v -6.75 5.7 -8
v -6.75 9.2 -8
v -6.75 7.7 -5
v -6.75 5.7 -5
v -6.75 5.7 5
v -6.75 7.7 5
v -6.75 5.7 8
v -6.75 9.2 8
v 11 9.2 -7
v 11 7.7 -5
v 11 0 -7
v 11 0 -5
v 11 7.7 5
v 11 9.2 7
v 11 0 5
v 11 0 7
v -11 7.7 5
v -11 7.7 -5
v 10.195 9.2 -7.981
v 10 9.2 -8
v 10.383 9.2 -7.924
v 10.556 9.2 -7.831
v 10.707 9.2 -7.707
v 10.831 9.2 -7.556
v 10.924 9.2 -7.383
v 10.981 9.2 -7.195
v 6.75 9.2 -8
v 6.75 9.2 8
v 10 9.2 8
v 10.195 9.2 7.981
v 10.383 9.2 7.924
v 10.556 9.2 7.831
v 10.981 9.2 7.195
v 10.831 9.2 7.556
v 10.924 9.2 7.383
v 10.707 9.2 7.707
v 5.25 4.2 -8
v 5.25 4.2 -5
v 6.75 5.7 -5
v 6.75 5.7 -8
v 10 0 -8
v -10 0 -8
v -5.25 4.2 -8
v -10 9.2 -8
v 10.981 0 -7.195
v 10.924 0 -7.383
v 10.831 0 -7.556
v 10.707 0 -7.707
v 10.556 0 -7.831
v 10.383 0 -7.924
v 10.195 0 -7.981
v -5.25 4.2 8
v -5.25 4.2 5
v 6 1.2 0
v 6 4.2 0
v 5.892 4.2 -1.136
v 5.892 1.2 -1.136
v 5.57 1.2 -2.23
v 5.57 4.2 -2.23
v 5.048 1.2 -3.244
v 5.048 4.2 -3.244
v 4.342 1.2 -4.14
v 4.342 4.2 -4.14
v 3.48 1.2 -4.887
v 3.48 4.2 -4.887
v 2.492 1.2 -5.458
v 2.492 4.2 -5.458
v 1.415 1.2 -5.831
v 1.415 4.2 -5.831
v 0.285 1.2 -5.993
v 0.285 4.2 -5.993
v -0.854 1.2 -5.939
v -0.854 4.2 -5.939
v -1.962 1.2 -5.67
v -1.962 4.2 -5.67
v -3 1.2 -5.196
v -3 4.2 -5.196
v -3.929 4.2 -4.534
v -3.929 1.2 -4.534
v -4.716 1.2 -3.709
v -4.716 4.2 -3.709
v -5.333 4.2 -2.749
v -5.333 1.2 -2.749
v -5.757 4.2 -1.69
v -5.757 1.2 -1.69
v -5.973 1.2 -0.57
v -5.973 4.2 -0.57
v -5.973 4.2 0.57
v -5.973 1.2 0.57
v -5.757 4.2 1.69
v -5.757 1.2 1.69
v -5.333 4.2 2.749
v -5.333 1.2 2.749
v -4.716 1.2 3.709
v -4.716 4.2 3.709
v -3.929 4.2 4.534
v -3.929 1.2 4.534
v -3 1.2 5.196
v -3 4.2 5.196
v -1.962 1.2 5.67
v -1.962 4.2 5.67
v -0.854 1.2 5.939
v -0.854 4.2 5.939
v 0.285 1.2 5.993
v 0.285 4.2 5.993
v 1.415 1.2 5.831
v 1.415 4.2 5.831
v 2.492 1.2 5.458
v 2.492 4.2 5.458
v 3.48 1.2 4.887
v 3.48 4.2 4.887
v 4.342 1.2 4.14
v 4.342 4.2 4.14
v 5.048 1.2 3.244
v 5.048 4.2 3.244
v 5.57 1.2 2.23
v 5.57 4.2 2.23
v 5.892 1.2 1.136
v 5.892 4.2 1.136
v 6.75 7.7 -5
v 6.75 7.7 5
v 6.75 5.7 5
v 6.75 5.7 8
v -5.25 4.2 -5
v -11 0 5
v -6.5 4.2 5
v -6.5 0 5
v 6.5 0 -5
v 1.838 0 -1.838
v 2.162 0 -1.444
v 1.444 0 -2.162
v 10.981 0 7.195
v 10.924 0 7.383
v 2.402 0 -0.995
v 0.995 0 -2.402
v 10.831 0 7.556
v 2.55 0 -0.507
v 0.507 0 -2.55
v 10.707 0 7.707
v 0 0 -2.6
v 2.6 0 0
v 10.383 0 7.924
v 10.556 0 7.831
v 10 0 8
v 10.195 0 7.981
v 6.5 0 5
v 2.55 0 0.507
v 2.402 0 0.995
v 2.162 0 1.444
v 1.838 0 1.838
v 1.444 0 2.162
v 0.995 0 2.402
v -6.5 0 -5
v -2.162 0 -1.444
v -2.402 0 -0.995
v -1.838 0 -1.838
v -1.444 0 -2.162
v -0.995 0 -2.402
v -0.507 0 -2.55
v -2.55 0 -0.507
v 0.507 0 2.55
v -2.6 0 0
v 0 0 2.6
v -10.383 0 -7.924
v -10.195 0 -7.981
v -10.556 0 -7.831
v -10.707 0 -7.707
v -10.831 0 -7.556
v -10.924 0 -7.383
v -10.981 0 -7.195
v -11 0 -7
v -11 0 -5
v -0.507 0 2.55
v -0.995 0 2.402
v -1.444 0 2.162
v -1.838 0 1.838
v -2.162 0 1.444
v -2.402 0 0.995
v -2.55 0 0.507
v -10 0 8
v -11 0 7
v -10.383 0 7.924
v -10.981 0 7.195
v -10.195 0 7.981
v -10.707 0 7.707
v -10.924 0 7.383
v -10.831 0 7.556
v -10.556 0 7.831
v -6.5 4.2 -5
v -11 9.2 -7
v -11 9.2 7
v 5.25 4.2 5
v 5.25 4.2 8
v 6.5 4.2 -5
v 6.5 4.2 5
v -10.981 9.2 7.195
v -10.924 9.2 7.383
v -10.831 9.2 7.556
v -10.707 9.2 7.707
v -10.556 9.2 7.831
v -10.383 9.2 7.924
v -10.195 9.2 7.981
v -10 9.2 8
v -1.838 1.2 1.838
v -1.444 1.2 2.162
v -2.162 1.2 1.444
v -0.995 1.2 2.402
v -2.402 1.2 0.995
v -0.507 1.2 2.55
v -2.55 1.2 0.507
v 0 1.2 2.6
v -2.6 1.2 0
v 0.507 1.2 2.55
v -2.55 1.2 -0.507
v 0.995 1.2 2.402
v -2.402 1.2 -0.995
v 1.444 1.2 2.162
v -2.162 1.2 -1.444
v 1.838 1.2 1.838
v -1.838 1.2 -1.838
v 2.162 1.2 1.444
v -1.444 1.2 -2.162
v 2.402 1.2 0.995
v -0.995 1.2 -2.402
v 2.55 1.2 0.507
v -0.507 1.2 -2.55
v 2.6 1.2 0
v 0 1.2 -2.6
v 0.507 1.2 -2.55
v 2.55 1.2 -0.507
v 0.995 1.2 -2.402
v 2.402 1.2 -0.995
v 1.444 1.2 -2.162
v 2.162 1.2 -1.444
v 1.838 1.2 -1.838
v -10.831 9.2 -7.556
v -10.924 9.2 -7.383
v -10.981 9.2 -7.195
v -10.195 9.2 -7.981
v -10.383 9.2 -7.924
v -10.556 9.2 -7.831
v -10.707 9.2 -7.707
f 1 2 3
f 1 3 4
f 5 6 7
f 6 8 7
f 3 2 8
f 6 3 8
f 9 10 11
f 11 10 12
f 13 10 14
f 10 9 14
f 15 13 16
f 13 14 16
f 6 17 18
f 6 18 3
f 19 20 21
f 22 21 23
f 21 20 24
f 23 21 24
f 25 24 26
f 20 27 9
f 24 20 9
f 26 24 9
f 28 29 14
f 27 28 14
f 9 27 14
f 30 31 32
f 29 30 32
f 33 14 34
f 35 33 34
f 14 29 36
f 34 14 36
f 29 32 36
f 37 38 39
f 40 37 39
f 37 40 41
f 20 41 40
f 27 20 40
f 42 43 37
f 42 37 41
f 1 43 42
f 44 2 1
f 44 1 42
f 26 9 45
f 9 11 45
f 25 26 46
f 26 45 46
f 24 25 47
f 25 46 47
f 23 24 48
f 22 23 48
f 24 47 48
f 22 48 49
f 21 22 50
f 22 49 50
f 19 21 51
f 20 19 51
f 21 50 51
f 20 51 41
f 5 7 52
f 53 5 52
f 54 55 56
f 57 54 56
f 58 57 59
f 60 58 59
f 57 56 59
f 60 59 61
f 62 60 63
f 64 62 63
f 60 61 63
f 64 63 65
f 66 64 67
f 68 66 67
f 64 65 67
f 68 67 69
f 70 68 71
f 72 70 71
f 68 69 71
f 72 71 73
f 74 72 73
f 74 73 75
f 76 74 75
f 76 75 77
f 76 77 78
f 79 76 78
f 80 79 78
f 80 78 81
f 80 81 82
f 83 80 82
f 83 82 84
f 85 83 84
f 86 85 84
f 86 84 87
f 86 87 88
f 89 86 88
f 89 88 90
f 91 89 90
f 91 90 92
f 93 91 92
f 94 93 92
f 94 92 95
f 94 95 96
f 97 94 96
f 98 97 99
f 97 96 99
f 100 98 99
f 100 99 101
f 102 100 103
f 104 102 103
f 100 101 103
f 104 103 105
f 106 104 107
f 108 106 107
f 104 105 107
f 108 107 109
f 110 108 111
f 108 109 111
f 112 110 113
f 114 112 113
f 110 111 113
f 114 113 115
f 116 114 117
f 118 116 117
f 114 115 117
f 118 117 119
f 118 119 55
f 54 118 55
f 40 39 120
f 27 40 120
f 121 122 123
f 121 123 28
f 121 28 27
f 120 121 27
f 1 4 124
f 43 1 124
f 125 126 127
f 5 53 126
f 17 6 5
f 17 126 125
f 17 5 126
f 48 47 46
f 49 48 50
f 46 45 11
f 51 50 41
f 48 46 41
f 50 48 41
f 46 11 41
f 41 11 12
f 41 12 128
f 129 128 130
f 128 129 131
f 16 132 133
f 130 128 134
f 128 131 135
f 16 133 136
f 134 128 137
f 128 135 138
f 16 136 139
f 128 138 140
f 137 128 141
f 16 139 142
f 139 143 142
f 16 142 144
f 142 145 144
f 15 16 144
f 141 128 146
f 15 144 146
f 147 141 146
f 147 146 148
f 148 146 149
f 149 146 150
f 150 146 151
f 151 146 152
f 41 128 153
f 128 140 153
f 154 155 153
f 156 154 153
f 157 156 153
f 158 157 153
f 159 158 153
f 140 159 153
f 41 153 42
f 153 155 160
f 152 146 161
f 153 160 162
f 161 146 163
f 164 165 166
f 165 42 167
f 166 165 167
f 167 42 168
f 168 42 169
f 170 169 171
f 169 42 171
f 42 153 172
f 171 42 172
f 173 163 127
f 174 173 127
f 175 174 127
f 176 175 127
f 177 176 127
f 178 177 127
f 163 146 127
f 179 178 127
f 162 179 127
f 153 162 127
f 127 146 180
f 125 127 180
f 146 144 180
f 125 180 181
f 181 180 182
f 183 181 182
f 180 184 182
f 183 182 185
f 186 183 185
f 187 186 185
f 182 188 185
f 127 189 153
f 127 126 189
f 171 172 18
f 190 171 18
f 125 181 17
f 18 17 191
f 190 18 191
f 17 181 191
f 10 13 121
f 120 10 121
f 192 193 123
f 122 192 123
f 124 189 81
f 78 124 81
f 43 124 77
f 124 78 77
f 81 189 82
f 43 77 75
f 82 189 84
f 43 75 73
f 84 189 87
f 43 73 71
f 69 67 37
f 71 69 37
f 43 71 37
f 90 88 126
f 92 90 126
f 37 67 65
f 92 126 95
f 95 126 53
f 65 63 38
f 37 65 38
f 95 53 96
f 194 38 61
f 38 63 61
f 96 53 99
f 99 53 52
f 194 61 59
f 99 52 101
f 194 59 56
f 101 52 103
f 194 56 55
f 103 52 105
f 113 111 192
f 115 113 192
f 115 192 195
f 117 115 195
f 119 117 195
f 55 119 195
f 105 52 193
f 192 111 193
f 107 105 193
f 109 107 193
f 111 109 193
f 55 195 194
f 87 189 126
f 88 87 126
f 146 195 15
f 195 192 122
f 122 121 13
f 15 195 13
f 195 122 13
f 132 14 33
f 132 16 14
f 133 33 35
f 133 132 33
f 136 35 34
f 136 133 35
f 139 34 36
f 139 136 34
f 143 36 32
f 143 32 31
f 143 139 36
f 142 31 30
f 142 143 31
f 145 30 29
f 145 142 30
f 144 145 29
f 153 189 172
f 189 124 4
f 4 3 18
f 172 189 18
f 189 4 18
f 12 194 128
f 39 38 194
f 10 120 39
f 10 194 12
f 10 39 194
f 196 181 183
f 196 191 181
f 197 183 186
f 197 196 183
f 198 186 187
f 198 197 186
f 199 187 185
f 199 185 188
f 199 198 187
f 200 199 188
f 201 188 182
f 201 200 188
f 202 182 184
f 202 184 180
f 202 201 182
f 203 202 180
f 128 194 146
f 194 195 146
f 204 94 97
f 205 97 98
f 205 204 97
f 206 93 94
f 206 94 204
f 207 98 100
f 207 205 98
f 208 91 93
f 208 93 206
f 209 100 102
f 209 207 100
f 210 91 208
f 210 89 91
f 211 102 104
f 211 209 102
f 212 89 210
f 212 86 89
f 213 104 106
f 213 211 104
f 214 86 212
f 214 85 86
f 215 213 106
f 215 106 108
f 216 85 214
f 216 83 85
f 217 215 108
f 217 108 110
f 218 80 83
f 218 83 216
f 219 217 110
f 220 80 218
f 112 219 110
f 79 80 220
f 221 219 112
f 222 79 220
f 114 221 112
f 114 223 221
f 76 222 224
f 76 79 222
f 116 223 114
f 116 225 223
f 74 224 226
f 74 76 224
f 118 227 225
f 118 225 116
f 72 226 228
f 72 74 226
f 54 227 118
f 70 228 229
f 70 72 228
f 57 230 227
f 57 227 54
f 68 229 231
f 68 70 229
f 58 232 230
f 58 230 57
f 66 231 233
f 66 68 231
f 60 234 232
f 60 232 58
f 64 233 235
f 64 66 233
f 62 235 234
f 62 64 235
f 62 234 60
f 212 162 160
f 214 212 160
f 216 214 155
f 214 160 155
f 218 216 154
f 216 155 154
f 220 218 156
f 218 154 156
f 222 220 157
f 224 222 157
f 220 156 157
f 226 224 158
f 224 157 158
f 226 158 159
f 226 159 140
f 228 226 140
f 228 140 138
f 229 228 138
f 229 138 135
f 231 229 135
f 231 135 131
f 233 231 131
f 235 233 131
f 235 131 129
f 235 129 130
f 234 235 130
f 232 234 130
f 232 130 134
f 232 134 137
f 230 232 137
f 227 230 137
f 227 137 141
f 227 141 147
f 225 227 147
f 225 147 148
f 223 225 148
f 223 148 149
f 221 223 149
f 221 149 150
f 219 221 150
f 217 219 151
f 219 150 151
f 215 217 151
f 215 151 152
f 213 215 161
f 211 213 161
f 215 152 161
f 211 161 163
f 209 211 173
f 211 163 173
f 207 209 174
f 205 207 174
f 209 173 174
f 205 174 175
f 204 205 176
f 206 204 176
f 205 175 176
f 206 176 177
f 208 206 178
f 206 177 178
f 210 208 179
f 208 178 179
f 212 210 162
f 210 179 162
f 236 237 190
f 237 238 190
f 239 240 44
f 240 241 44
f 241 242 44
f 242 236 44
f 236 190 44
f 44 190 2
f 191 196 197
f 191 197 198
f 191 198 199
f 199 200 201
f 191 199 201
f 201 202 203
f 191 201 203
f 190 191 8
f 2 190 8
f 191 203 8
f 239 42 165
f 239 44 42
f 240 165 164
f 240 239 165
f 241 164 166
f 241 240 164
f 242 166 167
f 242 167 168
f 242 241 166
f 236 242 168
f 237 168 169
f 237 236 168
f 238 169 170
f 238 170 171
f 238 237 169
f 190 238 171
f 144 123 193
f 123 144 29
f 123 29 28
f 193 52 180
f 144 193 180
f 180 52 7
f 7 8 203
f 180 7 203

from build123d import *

# Parameters (mm, degrees)
EXTRUDE_1_DEPTH             = 8
CUT_EXTRUDE_1_DEPTH         = 5
HOLE_WIZARD_M51_D           = 5.2
HOLE_WIZARD_M51_DEPTH       = 4.2
HOLE_WIZARD_M51_CBORE_D     = 12
HOLE_WIZARD_M51_CBORE_DEPTH = 3
FILLET_1_R                  = 1


with BuildPart() as part:
    # Эскиз1 → Бобышка-Вытянуть1 (new body, symmetric)
    with BuildSketch(Plane.XY):
        Polygon((11, 0), (-11, 0), (-11, 9.2), (-6.75, 9.2), (-6.75, 5.7), (-5.25, 4.2), (5.25, 4.2), (6.75, 5.7), (6.75, 9.2), (11, 9.2), align=None)
    extrude(amount=EXTRUDE_1_DEPTH, both=True)

    # Эскиз2 → Вырез-Вытянуть1 (cut, symmetric)
    with BuildSketch(Plane.XY):
        Polygon((-11, 7.7), (-6.75, 7.7), (-6.75, 5.7), (-5.25, 4.2), (-6.5, 4.2), (-6.5, 0), (-11, 0), align=None)
    cut_extrude_1 = extrude(amount=CUT_EXTRUDE_1_DEPTH, both=True, mode=Mode.SUBTRACT)

    # Зеркальное отражение1: Вырез-Вытянуть1 across plane
    add(cut_extrude_1.mirror(Plane(origin=(0, 0, 0), x_dir=(0, 0, 1), z_dir=(1, 0, 0))), mode=Mode.SUBTRACT)

    # Цековка для  болта с шестигранной головкой M51
    with Locations(Plane(origin=(0, 4.2, 0), x_dir=(1, 0, 0), z_dir=(0, 1, 0))):
        with Locations((0, 0)):
            CounterBoreHole(HOLE_WIZARD_M51_D / 2, HOLE_WIZARD_M51_CBORE_D / 2, HOLE_WIZARD_M51_CBORE_DEPTH, depth=HOLE_WIZARD_M51_DEPTH)

    # Скругление1
    fillet_1_edges = [part.edges().sort_by_distance(p)[0] for p in [
        (11, 4.6, 8),
        (11, 4.6, -8),
        (-11, 4.6, -8),
        (-11, 4.6, 8),
    ]]
    fillet(fillet_1_edges, radius=FILLET_1_R)


solid = part.part
